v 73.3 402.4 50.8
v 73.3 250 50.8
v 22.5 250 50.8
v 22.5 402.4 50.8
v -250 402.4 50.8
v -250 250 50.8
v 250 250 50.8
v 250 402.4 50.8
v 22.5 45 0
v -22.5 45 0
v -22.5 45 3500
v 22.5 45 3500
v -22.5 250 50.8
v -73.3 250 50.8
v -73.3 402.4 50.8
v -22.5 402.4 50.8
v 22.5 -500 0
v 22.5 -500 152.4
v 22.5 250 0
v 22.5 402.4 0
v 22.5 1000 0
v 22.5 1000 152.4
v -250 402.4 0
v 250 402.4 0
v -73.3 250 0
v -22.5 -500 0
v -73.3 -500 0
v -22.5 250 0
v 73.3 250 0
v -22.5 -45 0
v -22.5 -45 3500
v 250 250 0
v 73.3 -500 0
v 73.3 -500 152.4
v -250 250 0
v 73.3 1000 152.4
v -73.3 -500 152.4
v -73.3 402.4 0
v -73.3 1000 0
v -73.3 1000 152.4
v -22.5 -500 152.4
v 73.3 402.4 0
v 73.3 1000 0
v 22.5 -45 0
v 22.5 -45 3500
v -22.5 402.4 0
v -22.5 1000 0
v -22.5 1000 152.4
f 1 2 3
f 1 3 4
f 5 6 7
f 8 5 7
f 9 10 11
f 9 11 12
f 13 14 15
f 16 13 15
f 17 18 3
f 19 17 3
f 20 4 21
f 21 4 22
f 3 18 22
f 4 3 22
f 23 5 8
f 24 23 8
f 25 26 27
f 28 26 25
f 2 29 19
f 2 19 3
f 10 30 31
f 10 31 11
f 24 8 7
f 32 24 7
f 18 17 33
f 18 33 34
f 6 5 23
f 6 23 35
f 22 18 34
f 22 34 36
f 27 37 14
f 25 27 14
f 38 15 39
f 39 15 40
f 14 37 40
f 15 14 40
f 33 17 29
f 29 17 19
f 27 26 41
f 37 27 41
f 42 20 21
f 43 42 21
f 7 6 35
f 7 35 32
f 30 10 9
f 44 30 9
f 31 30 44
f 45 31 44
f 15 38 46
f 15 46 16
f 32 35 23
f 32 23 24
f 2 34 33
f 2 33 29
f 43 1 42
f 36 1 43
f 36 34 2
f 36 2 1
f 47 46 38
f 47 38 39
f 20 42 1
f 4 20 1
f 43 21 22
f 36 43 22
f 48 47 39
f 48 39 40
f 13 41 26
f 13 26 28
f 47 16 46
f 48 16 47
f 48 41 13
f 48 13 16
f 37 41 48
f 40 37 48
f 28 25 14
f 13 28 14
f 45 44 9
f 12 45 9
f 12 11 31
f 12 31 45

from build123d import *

# Parameters (mm, degrees)
F0_W     = 45
F0_H     = 90
F1_DEPTH = 3500
F2_W     = 1500
F2_H     = 152.4
F3_DEPTH = 50.8
F4_W     = 152.4
F4_H     = 50.8
F5_DEPTH = 50.8
F7_W     = 500
F7_H     = 152.4
F8_DEPTH = 50.8


with BuildPart() as f1:
    # F0 (on Top) → F1 (new body)
    with BuildSketch(Plane.XY):
        Rectangle(F0_W, F0_H)
    extrude(amount=F1_DEPTH)


with BuildPart() as f3:
    # F2 (on face) → F3 (new body)
    with BuildSketch(Plane.YZ.offset(22.5)):
        with Locations((250, 76.2)):
            Rectangle(F2_W, F2_H)
    extrude(amount=F3_DEPTH)

    # F4 (on face) → F5 (cut)
    with BuildSketch(Plane.YZ.offset(73.3)):
        with Locations((326.2, 25.4)):
            Rectangle(F4_W, F4_H)
    extrude(amount=-F5_DEPTH, mode=Mode.SUBTRACT)


with BuildPart() as f6_1:
    # F6: instance of F3
    add(f3.part.mirror(Plane.YZ))


with BuildPart() as f8:
    # F7 (on face) → F8 (new body)
    with BuildSketch(Plane(origin=(0, 0, 50.8), x_dir=(1, 0, 0), z_dir=(0, 0, -1))):
        with Locations((0, -326.2)):
            Rectangle(F7_W, F7_H)
    extrude(amount=F8_DEPTH)


solid = Compound([f1.part, f3.part, f6_1.part, f8.part])
